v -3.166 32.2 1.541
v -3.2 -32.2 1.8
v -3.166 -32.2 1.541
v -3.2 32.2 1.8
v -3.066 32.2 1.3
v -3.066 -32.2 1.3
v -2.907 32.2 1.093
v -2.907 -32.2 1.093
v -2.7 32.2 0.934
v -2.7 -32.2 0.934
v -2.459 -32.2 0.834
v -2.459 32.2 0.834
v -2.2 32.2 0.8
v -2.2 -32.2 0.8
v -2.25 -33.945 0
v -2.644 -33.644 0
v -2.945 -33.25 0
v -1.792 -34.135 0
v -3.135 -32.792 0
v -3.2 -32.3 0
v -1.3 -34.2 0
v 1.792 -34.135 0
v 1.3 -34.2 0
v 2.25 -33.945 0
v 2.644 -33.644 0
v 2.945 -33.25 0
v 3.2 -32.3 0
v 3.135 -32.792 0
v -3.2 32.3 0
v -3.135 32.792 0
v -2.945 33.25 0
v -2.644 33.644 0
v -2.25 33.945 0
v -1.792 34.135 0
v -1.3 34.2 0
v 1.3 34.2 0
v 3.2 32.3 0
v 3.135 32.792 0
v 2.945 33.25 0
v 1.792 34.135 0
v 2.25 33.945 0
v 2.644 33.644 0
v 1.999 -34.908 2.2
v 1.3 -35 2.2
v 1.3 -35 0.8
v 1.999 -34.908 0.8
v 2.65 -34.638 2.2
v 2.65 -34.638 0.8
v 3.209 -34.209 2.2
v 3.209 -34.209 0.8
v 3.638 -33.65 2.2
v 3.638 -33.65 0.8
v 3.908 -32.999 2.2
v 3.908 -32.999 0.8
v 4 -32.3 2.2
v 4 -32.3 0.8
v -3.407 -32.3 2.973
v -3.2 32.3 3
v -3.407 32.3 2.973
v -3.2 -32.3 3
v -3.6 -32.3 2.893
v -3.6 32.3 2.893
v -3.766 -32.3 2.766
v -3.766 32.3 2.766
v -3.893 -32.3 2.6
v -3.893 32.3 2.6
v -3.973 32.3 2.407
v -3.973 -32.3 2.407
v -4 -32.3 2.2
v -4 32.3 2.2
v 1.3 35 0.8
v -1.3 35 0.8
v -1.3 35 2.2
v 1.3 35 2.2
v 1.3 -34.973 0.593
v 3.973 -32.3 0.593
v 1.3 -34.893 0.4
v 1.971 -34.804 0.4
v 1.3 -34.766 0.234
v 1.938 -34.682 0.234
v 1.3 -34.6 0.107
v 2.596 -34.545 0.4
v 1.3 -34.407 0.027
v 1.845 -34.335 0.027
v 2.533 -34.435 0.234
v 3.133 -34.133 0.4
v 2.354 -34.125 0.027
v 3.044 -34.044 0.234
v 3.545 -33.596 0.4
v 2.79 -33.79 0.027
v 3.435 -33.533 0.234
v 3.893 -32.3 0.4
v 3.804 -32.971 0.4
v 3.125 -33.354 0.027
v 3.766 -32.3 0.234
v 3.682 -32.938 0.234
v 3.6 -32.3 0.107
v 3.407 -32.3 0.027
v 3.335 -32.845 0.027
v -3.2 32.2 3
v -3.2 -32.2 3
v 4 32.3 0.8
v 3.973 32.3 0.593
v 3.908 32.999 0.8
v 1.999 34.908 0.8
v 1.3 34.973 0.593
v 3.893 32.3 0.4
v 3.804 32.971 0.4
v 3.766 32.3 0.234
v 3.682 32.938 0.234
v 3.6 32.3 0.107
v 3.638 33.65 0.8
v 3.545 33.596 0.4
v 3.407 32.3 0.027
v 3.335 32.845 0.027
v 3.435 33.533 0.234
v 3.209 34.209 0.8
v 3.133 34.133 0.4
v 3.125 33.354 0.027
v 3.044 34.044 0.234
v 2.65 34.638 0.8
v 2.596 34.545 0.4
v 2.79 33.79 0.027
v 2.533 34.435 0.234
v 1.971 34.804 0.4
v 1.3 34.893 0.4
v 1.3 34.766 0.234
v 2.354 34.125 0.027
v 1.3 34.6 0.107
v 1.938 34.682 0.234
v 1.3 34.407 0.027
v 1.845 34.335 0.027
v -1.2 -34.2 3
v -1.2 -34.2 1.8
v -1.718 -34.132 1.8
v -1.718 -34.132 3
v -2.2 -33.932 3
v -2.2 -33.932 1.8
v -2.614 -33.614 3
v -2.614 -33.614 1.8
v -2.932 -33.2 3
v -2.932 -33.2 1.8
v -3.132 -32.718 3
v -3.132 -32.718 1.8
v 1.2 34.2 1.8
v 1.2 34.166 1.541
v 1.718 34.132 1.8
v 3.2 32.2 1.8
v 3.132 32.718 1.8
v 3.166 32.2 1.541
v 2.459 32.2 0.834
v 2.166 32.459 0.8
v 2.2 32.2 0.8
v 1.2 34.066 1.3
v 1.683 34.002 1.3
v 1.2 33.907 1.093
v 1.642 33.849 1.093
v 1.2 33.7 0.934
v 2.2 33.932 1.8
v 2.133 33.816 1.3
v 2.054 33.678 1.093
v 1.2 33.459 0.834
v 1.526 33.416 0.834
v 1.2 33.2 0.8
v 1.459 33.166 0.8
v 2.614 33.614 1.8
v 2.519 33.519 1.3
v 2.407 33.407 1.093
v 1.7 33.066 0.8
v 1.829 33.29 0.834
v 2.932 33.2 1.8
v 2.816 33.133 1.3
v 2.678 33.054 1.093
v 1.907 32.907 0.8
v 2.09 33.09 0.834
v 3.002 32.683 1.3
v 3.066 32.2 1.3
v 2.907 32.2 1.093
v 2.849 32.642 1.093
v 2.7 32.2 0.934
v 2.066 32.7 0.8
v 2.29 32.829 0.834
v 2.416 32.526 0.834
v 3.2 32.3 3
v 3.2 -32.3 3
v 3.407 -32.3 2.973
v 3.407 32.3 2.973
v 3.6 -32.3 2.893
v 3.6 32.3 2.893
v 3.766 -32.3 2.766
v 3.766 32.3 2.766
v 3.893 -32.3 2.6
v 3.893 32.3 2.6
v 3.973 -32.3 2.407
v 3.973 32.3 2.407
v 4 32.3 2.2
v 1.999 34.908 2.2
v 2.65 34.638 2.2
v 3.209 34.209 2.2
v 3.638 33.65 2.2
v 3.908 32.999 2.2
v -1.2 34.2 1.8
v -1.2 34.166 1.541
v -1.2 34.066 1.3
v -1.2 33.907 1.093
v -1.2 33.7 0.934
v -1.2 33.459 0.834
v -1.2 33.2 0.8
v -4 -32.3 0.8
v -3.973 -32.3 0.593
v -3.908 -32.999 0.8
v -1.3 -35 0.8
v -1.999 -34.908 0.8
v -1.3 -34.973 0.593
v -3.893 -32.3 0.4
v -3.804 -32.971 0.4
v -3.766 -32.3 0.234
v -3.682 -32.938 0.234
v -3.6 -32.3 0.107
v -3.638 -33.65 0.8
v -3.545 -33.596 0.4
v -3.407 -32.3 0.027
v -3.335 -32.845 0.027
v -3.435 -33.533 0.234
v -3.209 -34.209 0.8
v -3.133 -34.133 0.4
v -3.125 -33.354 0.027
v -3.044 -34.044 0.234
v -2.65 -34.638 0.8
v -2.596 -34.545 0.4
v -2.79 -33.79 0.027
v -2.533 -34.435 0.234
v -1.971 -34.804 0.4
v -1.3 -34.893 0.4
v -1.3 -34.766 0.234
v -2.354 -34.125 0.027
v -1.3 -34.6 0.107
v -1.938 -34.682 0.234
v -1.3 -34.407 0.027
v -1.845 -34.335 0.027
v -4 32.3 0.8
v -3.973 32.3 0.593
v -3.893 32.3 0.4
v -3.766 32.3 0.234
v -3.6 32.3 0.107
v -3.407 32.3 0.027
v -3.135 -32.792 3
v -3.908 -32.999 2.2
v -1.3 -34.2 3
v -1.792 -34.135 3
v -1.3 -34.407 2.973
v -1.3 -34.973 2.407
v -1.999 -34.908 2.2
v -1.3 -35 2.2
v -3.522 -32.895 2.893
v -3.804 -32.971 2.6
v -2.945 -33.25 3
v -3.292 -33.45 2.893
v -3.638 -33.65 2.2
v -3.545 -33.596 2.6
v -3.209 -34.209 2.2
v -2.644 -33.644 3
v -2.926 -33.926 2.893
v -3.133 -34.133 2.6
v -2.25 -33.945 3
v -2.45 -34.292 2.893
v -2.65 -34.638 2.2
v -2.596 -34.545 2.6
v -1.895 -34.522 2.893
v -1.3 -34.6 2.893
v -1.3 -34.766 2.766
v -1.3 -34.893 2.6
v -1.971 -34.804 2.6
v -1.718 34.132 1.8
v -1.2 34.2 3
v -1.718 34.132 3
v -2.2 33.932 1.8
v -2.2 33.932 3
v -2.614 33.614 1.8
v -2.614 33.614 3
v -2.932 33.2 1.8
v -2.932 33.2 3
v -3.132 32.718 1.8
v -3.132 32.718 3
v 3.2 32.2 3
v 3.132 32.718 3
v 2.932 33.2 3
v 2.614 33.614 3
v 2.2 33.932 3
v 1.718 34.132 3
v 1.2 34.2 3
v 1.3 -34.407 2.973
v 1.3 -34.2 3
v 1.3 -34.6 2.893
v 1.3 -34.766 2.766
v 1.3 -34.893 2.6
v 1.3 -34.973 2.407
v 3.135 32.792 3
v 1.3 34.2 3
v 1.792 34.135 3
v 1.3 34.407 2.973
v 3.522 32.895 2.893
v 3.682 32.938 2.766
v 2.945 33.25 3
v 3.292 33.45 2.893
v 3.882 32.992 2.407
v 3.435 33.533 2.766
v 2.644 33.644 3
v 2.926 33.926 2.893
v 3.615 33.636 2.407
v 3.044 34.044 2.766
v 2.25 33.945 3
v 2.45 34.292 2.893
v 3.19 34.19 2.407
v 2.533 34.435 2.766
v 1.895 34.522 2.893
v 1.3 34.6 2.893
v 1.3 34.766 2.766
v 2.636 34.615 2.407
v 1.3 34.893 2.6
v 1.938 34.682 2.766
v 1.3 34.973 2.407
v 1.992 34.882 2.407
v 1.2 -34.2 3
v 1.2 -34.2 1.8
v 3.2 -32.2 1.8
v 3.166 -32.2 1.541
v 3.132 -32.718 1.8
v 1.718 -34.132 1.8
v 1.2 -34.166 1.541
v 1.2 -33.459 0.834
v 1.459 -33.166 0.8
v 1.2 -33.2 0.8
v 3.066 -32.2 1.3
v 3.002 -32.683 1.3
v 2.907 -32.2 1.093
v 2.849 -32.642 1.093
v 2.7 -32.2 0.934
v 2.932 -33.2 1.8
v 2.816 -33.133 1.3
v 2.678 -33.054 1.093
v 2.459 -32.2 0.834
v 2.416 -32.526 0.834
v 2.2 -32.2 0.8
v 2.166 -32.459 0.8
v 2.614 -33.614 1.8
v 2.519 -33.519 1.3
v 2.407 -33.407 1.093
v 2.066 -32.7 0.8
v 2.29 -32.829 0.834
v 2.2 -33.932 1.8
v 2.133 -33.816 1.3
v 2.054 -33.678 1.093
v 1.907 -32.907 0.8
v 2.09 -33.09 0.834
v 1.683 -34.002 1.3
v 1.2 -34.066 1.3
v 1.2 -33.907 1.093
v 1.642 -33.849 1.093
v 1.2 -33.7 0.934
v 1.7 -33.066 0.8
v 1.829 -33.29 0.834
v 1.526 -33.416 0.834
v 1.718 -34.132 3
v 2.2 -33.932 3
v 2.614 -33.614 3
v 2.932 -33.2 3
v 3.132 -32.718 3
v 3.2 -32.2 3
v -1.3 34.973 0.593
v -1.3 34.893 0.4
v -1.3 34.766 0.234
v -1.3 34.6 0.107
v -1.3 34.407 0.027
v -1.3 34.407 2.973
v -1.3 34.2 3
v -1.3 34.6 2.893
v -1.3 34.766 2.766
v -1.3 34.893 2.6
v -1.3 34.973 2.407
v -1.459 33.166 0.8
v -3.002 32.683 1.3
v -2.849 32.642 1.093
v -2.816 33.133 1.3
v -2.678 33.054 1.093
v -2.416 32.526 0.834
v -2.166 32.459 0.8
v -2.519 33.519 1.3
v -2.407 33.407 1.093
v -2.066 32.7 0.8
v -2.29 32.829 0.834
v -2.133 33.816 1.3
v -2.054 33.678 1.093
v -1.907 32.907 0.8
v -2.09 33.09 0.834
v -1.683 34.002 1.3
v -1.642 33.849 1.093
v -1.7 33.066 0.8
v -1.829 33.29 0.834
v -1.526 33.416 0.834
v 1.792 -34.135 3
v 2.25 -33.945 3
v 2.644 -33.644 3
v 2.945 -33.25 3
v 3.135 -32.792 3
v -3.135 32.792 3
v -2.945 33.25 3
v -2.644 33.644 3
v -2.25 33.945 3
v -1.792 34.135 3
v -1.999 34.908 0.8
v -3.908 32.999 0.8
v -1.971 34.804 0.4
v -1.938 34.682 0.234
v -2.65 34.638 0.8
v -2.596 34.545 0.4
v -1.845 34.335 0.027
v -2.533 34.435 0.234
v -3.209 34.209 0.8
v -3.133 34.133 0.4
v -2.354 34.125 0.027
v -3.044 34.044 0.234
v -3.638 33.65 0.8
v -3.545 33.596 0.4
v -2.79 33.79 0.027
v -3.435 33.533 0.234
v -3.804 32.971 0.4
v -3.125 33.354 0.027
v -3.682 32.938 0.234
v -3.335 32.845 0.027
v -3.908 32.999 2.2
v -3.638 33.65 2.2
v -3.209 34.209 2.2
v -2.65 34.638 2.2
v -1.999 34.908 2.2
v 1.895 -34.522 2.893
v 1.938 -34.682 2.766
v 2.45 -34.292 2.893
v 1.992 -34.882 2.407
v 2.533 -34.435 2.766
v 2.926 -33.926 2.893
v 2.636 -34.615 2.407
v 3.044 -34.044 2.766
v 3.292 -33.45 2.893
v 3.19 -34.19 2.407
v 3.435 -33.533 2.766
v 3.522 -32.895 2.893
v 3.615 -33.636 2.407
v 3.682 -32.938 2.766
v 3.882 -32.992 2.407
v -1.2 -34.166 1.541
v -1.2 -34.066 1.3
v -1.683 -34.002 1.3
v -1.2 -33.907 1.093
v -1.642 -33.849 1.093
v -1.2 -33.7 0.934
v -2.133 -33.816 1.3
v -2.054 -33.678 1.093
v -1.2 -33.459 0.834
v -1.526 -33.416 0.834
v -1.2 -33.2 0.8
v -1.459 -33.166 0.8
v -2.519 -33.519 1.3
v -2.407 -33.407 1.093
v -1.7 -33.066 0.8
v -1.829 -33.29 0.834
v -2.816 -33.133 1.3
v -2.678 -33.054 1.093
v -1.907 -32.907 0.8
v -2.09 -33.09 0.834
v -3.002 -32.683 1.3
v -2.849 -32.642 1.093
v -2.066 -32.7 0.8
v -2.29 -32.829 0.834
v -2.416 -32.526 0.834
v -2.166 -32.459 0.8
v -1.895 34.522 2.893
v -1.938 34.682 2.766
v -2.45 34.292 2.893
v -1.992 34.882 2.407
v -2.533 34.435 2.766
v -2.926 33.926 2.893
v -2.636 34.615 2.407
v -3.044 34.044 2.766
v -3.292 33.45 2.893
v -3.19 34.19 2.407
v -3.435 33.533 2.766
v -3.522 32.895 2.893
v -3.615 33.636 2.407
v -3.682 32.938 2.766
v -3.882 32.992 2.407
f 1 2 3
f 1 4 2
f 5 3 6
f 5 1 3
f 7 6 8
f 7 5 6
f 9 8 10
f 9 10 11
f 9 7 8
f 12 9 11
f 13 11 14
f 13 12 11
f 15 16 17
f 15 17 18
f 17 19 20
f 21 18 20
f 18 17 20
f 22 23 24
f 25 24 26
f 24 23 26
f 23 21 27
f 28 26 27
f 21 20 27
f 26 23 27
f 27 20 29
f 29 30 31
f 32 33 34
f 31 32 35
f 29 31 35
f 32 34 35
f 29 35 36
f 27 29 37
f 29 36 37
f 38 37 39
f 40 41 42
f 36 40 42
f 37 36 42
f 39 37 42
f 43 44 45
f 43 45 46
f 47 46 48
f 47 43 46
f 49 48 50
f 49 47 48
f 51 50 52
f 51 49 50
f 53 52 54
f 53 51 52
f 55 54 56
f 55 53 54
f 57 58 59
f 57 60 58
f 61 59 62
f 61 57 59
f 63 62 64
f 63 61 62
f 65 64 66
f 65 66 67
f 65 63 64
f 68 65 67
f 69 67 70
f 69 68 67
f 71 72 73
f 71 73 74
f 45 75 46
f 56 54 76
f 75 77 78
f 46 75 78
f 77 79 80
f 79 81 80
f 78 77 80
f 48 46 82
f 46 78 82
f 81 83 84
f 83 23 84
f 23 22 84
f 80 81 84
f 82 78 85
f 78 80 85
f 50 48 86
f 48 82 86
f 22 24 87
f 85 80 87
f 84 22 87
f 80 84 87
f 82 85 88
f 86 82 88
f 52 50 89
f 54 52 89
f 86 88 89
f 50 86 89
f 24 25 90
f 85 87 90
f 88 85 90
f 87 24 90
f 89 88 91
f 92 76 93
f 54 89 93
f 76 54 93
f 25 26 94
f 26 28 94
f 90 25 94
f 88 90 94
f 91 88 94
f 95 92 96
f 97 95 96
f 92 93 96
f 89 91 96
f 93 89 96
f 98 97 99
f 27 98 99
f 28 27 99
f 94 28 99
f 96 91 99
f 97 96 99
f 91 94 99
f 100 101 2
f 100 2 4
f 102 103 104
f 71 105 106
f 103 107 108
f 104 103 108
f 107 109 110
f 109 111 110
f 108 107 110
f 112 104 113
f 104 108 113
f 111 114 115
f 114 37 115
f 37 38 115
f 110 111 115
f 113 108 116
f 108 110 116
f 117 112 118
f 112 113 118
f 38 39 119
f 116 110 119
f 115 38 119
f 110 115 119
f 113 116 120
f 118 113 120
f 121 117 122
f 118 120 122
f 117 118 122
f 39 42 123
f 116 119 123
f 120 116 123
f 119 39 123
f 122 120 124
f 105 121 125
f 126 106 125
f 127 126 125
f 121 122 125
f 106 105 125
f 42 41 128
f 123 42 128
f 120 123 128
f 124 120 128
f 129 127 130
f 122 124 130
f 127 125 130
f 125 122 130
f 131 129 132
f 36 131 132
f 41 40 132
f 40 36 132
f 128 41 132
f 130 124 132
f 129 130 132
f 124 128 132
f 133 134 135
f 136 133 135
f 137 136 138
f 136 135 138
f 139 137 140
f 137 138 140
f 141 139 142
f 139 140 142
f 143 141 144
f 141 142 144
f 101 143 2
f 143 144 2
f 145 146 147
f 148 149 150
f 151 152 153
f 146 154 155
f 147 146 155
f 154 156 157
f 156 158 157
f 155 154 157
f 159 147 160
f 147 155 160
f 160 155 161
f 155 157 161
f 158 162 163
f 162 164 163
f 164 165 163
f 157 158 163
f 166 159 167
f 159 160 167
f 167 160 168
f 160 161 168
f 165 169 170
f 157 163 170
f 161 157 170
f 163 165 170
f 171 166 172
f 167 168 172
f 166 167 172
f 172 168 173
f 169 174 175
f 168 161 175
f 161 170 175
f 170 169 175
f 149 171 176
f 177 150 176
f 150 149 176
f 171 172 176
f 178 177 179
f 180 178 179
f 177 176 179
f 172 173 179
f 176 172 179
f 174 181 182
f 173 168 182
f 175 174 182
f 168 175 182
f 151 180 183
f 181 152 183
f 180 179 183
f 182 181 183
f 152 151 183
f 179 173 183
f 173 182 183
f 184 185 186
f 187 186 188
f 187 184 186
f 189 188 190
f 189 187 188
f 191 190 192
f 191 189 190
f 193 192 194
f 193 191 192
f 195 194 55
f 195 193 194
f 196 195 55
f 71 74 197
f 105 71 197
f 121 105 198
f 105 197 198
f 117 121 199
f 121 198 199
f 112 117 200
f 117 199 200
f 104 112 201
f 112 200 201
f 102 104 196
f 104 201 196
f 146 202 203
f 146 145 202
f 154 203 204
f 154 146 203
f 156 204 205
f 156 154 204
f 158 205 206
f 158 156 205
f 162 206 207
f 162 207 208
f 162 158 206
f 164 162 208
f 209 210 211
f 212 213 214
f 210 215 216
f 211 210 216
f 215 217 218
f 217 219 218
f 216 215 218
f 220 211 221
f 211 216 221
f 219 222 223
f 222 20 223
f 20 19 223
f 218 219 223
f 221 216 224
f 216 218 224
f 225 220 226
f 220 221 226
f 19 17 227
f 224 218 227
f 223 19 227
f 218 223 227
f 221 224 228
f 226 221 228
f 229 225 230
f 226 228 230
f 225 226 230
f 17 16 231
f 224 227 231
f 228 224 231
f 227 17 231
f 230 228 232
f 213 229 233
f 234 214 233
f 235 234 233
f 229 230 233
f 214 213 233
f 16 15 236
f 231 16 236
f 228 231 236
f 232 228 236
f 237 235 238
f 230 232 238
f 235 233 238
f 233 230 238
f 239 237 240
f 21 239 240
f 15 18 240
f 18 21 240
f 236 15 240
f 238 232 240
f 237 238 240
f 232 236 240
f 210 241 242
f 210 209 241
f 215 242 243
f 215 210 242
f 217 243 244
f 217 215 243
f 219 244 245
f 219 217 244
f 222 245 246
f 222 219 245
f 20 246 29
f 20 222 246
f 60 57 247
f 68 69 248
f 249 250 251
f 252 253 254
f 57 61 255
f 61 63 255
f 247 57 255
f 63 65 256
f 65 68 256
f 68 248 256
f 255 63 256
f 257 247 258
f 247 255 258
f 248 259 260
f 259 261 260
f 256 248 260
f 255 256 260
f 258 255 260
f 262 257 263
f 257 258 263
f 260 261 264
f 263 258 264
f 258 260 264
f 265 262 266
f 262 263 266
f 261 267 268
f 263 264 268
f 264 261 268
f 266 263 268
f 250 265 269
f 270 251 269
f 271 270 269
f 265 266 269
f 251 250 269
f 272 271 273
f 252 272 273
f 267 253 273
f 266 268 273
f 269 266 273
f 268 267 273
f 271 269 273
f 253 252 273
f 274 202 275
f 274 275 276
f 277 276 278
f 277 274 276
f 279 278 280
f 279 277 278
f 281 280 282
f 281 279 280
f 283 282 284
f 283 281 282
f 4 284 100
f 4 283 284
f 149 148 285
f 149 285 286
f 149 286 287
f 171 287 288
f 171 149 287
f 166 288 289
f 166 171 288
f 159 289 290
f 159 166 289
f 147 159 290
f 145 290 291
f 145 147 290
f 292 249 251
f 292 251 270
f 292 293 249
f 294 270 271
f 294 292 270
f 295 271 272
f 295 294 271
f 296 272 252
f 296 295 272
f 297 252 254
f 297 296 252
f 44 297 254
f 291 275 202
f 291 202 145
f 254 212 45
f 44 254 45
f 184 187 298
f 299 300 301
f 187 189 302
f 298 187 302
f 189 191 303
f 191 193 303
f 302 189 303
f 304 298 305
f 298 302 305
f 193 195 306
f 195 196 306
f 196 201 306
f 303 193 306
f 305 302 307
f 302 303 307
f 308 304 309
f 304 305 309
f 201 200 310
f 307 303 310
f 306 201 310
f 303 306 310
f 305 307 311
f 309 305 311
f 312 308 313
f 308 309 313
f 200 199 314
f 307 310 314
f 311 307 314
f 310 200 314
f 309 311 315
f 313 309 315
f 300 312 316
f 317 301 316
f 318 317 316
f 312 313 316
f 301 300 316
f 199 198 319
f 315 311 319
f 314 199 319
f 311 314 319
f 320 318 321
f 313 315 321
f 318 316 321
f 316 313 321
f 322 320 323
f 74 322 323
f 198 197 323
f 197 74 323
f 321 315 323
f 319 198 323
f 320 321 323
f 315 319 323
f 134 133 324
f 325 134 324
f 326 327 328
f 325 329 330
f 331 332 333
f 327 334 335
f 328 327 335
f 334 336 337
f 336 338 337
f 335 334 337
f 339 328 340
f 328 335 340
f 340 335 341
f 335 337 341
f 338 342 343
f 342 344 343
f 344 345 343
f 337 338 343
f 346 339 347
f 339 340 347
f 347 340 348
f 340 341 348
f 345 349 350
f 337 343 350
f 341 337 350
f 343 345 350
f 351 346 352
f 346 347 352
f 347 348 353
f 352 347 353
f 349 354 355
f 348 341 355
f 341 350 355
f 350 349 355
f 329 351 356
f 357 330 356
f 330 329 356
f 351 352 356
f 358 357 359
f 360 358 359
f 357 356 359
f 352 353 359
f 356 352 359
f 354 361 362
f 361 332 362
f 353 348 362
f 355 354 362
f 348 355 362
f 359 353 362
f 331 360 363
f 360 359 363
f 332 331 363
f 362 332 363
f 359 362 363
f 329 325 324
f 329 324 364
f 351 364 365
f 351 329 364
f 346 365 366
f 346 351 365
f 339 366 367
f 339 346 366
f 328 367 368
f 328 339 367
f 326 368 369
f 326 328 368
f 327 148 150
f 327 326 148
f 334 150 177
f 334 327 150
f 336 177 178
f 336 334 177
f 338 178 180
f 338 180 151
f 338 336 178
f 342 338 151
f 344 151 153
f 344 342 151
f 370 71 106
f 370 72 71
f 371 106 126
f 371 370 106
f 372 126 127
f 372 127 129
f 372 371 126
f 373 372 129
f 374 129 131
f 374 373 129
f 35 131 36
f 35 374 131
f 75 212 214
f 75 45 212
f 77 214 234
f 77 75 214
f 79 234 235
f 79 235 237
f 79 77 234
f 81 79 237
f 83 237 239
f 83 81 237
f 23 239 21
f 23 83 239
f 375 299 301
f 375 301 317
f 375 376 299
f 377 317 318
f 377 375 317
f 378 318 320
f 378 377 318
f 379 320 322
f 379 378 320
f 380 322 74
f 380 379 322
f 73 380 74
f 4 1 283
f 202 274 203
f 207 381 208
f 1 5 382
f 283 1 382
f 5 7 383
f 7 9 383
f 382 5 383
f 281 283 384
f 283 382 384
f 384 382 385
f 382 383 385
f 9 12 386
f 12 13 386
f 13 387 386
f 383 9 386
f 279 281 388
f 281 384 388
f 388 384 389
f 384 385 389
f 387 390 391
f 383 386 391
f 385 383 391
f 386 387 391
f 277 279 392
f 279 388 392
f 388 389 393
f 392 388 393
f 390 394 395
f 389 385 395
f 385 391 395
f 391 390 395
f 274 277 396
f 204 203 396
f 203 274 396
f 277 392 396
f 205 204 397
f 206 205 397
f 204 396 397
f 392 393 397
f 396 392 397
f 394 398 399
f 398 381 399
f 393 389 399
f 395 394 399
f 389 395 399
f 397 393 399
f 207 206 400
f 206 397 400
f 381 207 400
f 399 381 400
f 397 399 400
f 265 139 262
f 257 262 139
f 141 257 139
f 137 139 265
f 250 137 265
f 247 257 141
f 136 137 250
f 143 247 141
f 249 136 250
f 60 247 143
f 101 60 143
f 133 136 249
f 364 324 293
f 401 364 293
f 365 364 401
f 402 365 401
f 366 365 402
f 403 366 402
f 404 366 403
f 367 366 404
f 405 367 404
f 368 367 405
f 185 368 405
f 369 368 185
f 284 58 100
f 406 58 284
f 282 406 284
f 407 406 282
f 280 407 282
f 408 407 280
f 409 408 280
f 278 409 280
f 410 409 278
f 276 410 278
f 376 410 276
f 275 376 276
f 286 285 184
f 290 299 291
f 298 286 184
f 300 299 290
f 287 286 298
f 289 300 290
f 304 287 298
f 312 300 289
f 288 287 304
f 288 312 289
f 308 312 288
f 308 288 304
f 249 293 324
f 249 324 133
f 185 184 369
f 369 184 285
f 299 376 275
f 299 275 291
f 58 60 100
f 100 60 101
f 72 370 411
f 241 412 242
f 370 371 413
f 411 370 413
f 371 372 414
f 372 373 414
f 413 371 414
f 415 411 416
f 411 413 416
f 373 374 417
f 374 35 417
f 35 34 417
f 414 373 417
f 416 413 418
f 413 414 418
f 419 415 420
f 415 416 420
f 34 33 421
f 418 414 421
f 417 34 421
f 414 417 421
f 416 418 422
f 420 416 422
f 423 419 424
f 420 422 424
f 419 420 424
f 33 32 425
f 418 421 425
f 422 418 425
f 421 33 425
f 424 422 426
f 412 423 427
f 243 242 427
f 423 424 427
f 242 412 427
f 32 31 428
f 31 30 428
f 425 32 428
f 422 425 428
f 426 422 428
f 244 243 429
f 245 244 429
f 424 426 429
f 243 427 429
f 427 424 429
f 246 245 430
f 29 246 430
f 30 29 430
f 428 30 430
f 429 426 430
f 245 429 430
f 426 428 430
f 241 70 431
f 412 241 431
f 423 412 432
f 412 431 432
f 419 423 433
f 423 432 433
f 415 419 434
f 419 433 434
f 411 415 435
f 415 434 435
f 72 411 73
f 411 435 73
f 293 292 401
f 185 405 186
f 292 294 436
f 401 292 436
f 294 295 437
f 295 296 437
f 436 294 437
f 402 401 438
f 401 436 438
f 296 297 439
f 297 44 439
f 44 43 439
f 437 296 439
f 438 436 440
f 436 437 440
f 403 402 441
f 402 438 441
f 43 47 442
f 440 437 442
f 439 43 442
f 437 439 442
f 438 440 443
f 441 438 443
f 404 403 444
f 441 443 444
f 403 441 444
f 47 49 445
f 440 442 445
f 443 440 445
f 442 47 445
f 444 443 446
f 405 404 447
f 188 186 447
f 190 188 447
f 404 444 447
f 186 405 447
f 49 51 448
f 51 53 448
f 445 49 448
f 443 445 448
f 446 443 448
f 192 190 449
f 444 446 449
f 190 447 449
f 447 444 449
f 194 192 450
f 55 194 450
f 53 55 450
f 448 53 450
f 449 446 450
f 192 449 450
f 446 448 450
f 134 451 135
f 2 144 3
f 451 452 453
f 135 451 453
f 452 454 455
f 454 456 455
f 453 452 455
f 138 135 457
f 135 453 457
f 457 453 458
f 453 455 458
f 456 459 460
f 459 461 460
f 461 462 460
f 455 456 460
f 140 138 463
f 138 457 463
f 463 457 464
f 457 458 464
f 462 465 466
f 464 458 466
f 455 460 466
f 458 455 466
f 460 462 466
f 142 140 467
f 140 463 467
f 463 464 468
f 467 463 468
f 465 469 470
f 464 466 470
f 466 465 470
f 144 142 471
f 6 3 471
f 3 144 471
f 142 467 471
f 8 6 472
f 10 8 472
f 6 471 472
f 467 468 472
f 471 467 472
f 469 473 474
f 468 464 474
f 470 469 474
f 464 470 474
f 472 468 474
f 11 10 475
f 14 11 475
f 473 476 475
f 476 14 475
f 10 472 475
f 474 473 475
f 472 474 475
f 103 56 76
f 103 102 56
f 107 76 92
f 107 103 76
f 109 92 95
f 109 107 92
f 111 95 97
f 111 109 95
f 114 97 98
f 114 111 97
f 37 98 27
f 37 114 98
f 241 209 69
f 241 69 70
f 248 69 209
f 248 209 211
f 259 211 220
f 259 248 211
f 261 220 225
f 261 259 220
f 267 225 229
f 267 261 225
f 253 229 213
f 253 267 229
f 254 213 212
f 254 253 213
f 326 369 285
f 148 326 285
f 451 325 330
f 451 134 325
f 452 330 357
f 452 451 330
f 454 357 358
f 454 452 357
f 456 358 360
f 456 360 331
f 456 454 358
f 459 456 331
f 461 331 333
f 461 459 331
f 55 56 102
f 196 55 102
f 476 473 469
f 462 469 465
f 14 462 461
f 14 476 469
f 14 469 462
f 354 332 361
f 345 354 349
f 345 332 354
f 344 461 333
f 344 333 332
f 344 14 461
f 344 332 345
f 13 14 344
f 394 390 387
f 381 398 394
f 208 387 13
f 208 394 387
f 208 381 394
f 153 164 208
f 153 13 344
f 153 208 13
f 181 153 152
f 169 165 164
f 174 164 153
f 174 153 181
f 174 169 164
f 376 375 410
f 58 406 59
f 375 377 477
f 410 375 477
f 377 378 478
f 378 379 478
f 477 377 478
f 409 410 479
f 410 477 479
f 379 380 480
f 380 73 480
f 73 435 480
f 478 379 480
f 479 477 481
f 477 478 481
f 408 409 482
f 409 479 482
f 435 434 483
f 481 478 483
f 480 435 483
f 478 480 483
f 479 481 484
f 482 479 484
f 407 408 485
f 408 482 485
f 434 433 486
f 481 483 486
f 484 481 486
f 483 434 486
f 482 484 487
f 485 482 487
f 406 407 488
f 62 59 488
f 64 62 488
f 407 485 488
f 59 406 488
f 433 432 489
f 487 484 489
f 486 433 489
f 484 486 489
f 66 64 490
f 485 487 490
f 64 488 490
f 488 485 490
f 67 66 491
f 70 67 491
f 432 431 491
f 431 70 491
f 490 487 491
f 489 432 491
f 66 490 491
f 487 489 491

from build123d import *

# Parameters (mm, degrees)
F0_W     = 8
F0_H     = 70
F1_DEPTH = 3
F2_W     = 6.4
F2_H     = 68.4
F3_DEPTH = 2.2
F4_R     = 2.7
F5_R     = 2
F6_R     = 0.79999
F7_R     = 1


# Not quite as in the source:
# - a fillet or chamfer is up to 0.001 mm smaller than in the source, because OpenCascade refuses the exact size


with BuildPart() as f1:
    # F0 (on Top) → F1 (new body)
    with BuildSketch(Plane.XY):
        Rectangle(F0_W, F0_H)
    extrude(amount=F1_DEPTH)

    # F2 (on face) → F3 (cut)
    with BuildSketch(Plane.XY.offset(3)):
        Rectangle(F2_W, F2_H)
    extrude(amount=-F3_DEPTH, mode=Mode.SUBTRACT)

    # F4
    f4_edges = [f1.edges().sort_by_distance(p)[0] for p in [
        (4, -35, 1.5),
        (-4, -35, 1.5),
        (-4, 35, 1.5),
        (4, 35, 1.5),
    ]]
    fillet(f4_edges, radius=F4_R)

    # F5
    f5_edges = [f1.edges().sort_by_distance(p)[0] for p in [
        (-3.2, 34.2, 1.9),
        (3.2, 34.2, 1.9),
        (-3.2, -34.2, 1.9),
        (3.2, -34.2, 1.9),
    ]]
    fillet(f5_edges, radius=F5_R)

    # F6 (radius 0.8 in the source; OpenCascade refuses exactly that, so slightly less here)
    f6_edges = [f1.edges().sort_by_distance(p)[0] for p in [
        (-3.209188, -34.209188, 0),
        (-3.209188, -34.209188, 3),
    ]]
    fillet(f6_edges, radius=F6_R)

    # F7
    f7_edges = [f1.edges().sort_by_distance(p)[0] for p in [
        (-2.614214, -33.614214, 0.8),
    ]]
    fillet(f7_edges, radius=F7_R)


solid = f1.part
